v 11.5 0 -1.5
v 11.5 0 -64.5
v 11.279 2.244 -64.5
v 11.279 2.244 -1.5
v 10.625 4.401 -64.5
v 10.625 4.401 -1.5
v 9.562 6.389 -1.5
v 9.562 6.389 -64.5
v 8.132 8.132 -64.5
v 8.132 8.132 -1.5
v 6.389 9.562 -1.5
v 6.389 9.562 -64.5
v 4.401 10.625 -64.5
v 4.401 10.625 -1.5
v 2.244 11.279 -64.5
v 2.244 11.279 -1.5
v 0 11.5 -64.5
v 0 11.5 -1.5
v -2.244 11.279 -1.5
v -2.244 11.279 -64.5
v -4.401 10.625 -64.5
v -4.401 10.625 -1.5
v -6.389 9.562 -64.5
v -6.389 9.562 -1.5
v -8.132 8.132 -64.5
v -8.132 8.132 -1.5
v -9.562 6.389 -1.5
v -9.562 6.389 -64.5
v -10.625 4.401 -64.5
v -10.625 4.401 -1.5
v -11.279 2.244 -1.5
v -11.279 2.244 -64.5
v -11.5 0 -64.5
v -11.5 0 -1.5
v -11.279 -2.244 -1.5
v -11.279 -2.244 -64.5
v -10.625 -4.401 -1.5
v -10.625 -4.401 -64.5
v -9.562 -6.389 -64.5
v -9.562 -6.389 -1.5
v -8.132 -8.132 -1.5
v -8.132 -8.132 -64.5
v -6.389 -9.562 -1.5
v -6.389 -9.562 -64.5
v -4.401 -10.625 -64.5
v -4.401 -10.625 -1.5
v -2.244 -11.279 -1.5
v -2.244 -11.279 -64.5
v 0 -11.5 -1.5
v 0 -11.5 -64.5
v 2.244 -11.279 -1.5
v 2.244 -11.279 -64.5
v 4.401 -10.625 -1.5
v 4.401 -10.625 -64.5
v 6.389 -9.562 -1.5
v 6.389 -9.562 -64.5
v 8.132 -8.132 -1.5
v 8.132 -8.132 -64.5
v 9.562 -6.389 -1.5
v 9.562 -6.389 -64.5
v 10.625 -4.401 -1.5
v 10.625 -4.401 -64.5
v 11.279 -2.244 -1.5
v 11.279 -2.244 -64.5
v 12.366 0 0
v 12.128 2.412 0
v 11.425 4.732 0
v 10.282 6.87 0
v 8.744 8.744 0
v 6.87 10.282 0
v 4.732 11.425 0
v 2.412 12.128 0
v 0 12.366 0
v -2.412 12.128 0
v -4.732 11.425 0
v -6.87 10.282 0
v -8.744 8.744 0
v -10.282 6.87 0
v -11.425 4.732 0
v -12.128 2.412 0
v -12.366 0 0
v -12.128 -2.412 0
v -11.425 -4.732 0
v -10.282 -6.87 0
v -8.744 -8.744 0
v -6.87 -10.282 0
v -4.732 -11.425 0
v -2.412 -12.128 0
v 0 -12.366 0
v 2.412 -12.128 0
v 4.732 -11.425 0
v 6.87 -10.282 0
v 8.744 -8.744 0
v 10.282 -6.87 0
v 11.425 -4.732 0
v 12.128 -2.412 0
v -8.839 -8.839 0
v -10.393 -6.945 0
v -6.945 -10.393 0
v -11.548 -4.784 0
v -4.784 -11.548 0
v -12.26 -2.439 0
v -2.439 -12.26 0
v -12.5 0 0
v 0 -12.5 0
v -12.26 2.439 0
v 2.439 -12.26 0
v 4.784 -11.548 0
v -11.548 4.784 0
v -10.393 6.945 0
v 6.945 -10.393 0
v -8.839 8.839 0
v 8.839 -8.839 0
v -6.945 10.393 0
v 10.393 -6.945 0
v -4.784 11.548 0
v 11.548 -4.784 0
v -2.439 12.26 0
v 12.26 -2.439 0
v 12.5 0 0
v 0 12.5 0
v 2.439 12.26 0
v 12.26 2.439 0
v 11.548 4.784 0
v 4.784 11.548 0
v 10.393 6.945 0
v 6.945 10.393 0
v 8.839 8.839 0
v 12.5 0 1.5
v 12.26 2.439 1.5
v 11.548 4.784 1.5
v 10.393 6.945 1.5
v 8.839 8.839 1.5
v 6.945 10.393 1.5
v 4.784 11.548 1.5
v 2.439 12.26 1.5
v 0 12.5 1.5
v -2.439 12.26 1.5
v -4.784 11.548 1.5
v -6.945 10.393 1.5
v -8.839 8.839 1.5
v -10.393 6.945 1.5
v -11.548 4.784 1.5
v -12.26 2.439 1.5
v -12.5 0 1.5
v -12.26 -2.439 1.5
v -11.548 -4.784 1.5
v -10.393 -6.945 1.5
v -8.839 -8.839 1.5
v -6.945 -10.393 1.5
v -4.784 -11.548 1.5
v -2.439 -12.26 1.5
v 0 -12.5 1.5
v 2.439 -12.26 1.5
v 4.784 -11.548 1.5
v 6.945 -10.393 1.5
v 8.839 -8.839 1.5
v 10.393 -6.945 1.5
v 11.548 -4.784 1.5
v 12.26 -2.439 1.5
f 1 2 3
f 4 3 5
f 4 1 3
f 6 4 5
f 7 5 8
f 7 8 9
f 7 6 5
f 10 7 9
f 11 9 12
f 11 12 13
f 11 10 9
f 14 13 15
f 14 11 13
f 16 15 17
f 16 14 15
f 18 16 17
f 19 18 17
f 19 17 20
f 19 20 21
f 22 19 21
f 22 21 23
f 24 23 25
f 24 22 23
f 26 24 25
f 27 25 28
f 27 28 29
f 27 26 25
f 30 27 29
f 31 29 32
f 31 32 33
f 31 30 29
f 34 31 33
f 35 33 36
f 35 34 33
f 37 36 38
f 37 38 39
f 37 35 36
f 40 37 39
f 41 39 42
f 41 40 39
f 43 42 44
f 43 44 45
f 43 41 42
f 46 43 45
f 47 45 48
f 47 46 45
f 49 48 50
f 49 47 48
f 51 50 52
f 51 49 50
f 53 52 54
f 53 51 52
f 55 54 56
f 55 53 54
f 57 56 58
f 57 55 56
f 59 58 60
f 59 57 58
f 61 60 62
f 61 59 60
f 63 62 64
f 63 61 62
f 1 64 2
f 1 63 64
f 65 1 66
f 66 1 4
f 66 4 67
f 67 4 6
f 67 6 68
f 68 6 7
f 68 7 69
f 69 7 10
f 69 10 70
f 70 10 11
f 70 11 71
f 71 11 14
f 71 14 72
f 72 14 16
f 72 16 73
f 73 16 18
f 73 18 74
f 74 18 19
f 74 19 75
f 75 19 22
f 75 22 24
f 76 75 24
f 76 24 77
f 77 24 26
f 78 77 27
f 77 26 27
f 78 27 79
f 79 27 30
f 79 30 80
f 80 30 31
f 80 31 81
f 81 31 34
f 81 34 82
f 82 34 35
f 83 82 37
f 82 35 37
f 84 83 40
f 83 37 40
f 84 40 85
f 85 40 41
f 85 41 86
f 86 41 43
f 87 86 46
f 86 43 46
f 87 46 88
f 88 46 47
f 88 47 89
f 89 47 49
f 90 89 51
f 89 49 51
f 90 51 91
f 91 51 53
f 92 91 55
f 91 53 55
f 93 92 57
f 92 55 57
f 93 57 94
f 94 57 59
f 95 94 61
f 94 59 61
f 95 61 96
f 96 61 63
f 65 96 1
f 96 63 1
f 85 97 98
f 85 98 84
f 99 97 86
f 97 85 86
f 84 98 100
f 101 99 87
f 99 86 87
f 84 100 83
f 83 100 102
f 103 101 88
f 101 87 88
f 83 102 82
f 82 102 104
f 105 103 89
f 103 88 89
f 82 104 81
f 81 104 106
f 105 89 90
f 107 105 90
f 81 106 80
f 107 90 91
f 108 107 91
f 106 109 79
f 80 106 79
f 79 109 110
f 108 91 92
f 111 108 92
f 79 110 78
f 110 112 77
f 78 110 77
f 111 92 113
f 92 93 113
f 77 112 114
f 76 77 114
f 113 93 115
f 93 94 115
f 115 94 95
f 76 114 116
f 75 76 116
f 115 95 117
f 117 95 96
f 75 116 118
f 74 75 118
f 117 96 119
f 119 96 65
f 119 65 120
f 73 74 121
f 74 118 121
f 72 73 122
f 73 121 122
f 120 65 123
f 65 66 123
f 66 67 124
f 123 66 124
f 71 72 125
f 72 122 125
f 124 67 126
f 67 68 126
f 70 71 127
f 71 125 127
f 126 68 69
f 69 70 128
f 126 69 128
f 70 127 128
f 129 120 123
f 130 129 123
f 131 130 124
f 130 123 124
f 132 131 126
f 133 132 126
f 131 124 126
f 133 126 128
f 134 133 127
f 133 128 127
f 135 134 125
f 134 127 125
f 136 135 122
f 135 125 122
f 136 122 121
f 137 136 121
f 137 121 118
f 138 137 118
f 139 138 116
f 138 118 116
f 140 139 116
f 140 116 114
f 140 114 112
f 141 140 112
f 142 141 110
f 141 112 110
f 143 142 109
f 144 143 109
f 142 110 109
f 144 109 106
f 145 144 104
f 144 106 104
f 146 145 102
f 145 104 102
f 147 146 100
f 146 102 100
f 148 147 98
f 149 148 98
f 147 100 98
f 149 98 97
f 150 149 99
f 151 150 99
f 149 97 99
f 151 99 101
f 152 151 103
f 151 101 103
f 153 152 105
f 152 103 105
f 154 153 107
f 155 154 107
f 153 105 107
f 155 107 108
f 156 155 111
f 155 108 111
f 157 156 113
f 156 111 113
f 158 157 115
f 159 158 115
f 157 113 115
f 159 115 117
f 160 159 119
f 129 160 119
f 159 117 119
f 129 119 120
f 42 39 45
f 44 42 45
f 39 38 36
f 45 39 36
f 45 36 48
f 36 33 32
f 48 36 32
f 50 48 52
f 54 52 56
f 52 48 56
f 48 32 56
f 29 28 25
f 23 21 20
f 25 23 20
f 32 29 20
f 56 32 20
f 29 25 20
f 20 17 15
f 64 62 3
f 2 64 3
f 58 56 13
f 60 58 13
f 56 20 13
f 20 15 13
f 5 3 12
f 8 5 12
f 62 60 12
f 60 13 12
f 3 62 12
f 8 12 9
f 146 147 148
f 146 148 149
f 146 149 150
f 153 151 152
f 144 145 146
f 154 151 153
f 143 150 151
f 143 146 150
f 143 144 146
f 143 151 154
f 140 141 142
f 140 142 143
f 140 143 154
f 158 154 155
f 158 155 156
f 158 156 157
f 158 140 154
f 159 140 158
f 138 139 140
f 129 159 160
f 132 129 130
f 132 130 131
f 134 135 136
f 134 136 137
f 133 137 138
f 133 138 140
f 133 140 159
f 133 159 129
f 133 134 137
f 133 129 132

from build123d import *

# Parameters (mm, degrees)
F0_R     = 12.5
F1_DEPTH = 1.5
F3_DEPTH = 1.5
F4_DEPTH = 63


# Not quite as in the source:
# - a fillet or chamfer that OpenCascade refuses, or shapes differently, is made with other operations: its cross-section is extruded or revolved along the edge and cut away or added


with BuildPart() as f1:
    # F0 (on Top) → F1 (new body)
    with BuildSketch(Plane.XY):
        Circle(F0_R)
    extrude(amount=-F1_DEPTH)

    # F2: chamfer of 1 x 1.7320508076 on 1 edges, made by hand

    # F2_s1 → F2_t2 (revolve, cut)
    with BuildSketch(Plane.XZ):
        Polygon((12.5, 0.2320508076), (11.5, -1.5), (12.5, -1.5), align=None)
    revolve(axis=Axis((0, 0, -1.5), (0, 0, 1)), mode=Mode.SUBTRACT)

    # F0 (on Top) → F3 (join)
    with BuildSketch(Plane.XY):
        Circle(F0_R)
    extrude(amount=F3_DEPTH)

    # F4 (add): a face of the model
    f4_faces = [f1.faces().sort_by_distance(p)[0] for p in [
        (0, 0, -1.5),
    ]]
    extrude(f4_faces, amount=F4_DEPTH)


solid = f1.part
